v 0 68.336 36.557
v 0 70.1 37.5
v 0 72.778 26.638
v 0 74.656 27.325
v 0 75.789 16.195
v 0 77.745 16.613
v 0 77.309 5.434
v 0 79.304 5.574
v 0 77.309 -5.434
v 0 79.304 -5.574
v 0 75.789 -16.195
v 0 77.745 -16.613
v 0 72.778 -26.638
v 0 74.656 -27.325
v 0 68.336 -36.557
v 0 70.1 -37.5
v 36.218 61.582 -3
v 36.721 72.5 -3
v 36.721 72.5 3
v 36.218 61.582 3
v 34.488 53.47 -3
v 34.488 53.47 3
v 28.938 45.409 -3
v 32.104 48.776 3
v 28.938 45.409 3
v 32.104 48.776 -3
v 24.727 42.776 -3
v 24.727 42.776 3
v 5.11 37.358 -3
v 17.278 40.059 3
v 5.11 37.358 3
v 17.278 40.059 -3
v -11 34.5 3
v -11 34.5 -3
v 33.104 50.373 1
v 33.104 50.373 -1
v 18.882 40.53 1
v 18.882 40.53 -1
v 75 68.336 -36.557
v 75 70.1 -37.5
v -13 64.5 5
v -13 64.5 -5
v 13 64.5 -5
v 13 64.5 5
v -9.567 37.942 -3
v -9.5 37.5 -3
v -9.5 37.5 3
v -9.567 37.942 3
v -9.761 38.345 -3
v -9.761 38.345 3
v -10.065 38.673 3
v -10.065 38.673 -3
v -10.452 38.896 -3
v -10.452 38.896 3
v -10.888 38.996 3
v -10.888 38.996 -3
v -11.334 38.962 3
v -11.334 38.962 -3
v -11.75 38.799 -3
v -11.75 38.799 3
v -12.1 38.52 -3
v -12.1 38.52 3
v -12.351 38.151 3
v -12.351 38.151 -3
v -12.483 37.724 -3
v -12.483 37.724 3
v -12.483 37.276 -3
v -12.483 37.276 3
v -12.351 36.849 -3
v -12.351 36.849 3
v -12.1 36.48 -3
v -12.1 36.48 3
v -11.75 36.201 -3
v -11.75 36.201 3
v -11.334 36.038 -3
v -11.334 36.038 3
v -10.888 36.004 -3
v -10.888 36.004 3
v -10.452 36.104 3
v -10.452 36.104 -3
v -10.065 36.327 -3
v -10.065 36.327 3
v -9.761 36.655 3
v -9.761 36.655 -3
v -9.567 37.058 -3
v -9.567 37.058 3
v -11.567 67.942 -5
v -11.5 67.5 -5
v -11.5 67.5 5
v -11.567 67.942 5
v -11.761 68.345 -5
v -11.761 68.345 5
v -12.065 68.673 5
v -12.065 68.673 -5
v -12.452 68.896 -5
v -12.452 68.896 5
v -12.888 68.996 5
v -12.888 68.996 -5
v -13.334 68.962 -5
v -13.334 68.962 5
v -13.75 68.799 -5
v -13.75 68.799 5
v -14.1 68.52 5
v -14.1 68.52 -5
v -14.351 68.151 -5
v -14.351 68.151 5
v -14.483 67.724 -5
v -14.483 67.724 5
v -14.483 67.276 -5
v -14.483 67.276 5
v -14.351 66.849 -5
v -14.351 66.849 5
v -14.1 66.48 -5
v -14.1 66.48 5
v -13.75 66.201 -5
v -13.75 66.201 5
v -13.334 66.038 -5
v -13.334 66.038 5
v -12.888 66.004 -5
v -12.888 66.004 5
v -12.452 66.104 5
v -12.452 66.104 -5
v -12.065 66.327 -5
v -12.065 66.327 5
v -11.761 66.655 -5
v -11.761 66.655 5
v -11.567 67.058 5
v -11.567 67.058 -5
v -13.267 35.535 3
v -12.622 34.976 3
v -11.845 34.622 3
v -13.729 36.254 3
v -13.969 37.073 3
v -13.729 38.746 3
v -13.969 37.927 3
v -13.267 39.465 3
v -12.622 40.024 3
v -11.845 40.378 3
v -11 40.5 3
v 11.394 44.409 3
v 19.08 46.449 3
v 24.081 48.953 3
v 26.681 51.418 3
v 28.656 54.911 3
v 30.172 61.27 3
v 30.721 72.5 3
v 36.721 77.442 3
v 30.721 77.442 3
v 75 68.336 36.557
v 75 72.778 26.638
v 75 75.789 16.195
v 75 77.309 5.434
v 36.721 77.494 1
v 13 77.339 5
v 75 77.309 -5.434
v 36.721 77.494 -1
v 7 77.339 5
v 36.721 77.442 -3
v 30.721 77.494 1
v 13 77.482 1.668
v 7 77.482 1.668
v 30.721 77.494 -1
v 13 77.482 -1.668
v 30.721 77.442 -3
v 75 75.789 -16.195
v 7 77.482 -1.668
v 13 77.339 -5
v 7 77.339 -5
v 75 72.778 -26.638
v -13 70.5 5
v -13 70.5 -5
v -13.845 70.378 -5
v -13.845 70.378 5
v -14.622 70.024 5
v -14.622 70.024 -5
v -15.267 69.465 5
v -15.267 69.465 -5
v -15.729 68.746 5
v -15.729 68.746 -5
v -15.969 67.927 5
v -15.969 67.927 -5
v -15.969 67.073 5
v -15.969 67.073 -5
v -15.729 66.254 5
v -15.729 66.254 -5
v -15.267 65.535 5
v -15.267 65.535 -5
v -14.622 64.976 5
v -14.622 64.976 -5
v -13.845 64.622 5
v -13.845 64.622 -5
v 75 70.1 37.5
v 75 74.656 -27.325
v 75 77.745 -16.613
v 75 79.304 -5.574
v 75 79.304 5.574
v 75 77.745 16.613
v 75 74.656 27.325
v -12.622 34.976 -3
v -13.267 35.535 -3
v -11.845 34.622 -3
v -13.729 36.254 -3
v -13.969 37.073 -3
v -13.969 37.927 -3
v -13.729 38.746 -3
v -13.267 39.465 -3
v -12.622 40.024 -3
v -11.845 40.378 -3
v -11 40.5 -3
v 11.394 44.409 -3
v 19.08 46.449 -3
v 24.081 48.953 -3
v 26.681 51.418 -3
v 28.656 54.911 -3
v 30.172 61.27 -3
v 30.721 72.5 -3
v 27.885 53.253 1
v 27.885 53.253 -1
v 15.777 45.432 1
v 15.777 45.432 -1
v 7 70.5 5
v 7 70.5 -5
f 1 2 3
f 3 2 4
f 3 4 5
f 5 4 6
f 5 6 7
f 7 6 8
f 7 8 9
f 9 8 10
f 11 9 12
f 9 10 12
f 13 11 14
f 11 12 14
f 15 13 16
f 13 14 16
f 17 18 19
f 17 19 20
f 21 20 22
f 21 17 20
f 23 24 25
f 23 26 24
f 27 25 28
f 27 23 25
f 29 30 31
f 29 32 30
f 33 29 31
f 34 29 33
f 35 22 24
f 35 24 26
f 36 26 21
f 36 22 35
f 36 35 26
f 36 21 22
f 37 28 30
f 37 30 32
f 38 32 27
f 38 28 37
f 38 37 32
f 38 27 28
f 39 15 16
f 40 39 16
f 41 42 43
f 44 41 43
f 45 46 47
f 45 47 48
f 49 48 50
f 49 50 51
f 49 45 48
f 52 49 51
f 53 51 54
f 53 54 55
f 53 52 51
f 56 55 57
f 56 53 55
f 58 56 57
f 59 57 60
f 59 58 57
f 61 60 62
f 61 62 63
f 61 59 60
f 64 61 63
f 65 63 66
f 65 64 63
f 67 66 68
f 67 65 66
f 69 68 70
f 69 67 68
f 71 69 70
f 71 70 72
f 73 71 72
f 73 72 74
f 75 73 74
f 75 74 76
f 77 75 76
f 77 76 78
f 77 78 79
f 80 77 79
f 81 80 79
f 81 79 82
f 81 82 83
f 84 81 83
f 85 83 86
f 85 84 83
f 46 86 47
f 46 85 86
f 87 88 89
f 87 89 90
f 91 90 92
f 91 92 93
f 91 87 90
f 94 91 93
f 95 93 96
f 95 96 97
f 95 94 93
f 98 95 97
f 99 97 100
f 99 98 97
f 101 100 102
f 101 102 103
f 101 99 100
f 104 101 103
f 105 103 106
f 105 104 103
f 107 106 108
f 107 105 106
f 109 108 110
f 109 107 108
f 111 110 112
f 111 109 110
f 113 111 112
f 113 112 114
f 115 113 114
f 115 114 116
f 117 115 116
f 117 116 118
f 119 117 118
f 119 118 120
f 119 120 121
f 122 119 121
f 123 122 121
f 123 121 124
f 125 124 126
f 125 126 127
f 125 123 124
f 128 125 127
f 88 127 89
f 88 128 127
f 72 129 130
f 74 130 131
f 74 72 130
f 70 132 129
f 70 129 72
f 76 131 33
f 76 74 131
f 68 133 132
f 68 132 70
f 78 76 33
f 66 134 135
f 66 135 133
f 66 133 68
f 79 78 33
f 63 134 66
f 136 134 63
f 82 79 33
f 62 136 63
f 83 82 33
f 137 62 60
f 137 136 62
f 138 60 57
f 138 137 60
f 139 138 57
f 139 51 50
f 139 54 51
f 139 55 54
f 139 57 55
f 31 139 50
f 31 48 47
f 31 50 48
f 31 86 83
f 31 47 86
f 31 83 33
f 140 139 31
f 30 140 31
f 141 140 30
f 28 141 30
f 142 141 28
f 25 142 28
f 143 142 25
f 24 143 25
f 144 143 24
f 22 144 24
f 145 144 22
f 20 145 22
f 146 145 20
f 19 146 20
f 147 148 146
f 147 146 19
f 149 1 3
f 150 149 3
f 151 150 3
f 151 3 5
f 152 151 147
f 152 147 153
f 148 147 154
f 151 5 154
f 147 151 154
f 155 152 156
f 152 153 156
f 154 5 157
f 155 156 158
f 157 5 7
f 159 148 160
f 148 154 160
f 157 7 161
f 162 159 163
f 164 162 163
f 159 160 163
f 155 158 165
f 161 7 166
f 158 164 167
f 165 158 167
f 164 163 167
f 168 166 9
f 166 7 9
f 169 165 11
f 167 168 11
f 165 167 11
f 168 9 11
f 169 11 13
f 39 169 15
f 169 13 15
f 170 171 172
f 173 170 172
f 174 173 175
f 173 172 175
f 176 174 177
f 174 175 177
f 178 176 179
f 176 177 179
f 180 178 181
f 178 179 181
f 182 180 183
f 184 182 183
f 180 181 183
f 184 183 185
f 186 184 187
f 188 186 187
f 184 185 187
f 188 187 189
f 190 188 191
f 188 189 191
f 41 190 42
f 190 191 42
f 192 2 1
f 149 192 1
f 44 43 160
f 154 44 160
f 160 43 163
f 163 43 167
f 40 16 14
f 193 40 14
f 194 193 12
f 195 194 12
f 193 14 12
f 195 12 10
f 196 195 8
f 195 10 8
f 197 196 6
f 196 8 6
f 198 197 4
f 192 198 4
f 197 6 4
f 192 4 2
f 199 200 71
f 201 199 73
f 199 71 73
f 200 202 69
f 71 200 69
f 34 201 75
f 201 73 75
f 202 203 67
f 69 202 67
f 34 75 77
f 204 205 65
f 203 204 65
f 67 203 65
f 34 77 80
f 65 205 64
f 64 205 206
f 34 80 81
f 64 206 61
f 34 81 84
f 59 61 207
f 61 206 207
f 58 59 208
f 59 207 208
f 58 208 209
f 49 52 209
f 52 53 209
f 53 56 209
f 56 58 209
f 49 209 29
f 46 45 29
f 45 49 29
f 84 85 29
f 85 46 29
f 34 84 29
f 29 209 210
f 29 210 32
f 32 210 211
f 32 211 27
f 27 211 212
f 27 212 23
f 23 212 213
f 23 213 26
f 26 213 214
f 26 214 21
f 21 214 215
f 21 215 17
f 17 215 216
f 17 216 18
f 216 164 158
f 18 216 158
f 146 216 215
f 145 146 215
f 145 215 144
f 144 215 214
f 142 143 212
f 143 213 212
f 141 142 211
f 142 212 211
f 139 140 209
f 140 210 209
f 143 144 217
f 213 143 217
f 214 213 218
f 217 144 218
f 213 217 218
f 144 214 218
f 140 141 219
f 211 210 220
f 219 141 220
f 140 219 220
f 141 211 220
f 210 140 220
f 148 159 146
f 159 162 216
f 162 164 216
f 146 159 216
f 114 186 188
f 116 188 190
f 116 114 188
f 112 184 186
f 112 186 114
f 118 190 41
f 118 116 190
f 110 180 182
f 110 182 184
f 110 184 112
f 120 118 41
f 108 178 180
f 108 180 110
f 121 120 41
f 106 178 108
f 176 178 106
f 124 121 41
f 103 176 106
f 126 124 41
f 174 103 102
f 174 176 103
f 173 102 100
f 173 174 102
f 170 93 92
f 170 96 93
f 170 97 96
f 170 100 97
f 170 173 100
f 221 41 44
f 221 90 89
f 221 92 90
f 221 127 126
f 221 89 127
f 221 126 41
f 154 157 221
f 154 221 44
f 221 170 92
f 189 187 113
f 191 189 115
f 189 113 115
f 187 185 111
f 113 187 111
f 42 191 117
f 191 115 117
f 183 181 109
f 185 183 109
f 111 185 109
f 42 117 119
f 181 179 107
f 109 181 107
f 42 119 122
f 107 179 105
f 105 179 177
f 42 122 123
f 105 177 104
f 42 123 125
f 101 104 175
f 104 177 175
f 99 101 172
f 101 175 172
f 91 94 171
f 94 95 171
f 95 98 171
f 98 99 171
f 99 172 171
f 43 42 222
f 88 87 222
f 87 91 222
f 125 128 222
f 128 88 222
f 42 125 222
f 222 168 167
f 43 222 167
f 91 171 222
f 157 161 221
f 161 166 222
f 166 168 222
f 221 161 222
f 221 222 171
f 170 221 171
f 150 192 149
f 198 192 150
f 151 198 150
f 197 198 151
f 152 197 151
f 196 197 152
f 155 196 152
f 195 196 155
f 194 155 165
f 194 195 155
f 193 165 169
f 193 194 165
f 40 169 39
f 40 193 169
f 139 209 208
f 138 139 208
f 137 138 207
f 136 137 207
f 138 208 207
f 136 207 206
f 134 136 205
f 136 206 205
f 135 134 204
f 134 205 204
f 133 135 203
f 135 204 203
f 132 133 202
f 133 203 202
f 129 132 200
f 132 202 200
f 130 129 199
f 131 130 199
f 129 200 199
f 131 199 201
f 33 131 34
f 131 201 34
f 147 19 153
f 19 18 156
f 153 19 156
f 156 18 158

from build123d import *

# Parameters (mm, degrees)
BOSS_EXTRU_1_DEPTH      = 75
BOSS_EXTRU_3_DEPTH      = 5
BOSS_EXTRU_3_DEPTH_BACK = 5
ESQUISSE7_R             = 1.5
BOSS_EXTRU_2_DEPTH      = 3
BOSS_EXTRU_2_DEPTH_BACK = 3
ESQUISSE3_R             = 1.5


with BuildPart() as part:
    # Esquisse1 → Boss.-Extru.1 (new body)
    with BuildSketch(Plane(origin=(0, 0, 0), x_dir=(0, 0, -1), z_dir=(1, 0, 0))):
        with BuildLine():
            Line((-37.5, 70.099928673), (-36.556603774, 68.336408455))
            ThreePointArc((-36.556603774, 68.336408455), (0, 77.5), (36.556603774, 68.336408455))
            Line((36.556603774, 68.336408455), (37.5, 70.099928673))
            ThreePointArc((37.5, 70.099928673), (0, 79.5), (-37.5, 70.099928673))
        make_face()
    extrude(amount=BOSS_EXTRU_1_DEPTH)

    # Esquisse7 → Boss.-Extru.3 (add, two sides: drawn at the far end of the back side and taken through both)
    with BuildSketch(Plane.XY.offset(-BOSS_EXTRU_3_DEPTH_BACK)):
        with BuildLine():
            Line((7, 77.5), (7, 70.5))
            Line((7, 70.5), (-13, 70.5))
            ThreePointArc((-13, 70.5), (-16, 67.5), (-13, 64.5))
            Line((-13, 64.5), (13, 64.5))
            Line((13, 64.5), (13, 77.5))
            Line((13, 77.5), (7, 77.5))
        make_face()
        with Locations((-13, 67.5)):
            Circle(ESQUISSE7_R, mode=Mode.SUBTRACT)
    extrude(amount=BOSS_EXTRU_3_DEPTH + BOSS_EXTRU_3_DEPTH_BACK)

    # Esquisse3 → Boss.-Extru.2 (add, two sides: drawn at the far end of the back side and taken through both)
    with BuildSketch(Plane.XY.offset(-BOSS_EXTRU_2_DEPTH_BACK)):
        with BuildLine():
            Line((30.72135955, 77.5), (30.72135955, 72.5))
            add(Edge.make_bspline(
                [(30.72135955, 72.5), (30.72135955, 44.694963761), (24.910353183, 46.831964153), (-11, 40.5)],
                knots=[0, 0, 0, 0, 1, 1, 1, 1], degree=3))
            ThreePointArc((-11, 40.5), (-14, 37.5), (-11, 34.5))
            add(Edge.make_bspline(
                [(36.72135955, 72.5), (36.72135955, 41.406516096), (28.397257564, 41.446799475), (-11, 34.5)],
                knots=[0, 0, 0, 0, 1, 1, 1, 1], degree=3))
            Line((36.72135955, 72.5), (36.72135955, 77.5))
            Line((36.72135955, 77.5), (30.72135955, 77.5))
        make_face()
        with Locations((-11, 37.5)):
            Circle(ESQUISSE3_R, mode=Mode.SUBTRACT)
    extrude(amount=BOSS_EXTRU_2_DEPTH + BOSS_EXTRU_2_DEPTH_BACK)


solid = part.part
